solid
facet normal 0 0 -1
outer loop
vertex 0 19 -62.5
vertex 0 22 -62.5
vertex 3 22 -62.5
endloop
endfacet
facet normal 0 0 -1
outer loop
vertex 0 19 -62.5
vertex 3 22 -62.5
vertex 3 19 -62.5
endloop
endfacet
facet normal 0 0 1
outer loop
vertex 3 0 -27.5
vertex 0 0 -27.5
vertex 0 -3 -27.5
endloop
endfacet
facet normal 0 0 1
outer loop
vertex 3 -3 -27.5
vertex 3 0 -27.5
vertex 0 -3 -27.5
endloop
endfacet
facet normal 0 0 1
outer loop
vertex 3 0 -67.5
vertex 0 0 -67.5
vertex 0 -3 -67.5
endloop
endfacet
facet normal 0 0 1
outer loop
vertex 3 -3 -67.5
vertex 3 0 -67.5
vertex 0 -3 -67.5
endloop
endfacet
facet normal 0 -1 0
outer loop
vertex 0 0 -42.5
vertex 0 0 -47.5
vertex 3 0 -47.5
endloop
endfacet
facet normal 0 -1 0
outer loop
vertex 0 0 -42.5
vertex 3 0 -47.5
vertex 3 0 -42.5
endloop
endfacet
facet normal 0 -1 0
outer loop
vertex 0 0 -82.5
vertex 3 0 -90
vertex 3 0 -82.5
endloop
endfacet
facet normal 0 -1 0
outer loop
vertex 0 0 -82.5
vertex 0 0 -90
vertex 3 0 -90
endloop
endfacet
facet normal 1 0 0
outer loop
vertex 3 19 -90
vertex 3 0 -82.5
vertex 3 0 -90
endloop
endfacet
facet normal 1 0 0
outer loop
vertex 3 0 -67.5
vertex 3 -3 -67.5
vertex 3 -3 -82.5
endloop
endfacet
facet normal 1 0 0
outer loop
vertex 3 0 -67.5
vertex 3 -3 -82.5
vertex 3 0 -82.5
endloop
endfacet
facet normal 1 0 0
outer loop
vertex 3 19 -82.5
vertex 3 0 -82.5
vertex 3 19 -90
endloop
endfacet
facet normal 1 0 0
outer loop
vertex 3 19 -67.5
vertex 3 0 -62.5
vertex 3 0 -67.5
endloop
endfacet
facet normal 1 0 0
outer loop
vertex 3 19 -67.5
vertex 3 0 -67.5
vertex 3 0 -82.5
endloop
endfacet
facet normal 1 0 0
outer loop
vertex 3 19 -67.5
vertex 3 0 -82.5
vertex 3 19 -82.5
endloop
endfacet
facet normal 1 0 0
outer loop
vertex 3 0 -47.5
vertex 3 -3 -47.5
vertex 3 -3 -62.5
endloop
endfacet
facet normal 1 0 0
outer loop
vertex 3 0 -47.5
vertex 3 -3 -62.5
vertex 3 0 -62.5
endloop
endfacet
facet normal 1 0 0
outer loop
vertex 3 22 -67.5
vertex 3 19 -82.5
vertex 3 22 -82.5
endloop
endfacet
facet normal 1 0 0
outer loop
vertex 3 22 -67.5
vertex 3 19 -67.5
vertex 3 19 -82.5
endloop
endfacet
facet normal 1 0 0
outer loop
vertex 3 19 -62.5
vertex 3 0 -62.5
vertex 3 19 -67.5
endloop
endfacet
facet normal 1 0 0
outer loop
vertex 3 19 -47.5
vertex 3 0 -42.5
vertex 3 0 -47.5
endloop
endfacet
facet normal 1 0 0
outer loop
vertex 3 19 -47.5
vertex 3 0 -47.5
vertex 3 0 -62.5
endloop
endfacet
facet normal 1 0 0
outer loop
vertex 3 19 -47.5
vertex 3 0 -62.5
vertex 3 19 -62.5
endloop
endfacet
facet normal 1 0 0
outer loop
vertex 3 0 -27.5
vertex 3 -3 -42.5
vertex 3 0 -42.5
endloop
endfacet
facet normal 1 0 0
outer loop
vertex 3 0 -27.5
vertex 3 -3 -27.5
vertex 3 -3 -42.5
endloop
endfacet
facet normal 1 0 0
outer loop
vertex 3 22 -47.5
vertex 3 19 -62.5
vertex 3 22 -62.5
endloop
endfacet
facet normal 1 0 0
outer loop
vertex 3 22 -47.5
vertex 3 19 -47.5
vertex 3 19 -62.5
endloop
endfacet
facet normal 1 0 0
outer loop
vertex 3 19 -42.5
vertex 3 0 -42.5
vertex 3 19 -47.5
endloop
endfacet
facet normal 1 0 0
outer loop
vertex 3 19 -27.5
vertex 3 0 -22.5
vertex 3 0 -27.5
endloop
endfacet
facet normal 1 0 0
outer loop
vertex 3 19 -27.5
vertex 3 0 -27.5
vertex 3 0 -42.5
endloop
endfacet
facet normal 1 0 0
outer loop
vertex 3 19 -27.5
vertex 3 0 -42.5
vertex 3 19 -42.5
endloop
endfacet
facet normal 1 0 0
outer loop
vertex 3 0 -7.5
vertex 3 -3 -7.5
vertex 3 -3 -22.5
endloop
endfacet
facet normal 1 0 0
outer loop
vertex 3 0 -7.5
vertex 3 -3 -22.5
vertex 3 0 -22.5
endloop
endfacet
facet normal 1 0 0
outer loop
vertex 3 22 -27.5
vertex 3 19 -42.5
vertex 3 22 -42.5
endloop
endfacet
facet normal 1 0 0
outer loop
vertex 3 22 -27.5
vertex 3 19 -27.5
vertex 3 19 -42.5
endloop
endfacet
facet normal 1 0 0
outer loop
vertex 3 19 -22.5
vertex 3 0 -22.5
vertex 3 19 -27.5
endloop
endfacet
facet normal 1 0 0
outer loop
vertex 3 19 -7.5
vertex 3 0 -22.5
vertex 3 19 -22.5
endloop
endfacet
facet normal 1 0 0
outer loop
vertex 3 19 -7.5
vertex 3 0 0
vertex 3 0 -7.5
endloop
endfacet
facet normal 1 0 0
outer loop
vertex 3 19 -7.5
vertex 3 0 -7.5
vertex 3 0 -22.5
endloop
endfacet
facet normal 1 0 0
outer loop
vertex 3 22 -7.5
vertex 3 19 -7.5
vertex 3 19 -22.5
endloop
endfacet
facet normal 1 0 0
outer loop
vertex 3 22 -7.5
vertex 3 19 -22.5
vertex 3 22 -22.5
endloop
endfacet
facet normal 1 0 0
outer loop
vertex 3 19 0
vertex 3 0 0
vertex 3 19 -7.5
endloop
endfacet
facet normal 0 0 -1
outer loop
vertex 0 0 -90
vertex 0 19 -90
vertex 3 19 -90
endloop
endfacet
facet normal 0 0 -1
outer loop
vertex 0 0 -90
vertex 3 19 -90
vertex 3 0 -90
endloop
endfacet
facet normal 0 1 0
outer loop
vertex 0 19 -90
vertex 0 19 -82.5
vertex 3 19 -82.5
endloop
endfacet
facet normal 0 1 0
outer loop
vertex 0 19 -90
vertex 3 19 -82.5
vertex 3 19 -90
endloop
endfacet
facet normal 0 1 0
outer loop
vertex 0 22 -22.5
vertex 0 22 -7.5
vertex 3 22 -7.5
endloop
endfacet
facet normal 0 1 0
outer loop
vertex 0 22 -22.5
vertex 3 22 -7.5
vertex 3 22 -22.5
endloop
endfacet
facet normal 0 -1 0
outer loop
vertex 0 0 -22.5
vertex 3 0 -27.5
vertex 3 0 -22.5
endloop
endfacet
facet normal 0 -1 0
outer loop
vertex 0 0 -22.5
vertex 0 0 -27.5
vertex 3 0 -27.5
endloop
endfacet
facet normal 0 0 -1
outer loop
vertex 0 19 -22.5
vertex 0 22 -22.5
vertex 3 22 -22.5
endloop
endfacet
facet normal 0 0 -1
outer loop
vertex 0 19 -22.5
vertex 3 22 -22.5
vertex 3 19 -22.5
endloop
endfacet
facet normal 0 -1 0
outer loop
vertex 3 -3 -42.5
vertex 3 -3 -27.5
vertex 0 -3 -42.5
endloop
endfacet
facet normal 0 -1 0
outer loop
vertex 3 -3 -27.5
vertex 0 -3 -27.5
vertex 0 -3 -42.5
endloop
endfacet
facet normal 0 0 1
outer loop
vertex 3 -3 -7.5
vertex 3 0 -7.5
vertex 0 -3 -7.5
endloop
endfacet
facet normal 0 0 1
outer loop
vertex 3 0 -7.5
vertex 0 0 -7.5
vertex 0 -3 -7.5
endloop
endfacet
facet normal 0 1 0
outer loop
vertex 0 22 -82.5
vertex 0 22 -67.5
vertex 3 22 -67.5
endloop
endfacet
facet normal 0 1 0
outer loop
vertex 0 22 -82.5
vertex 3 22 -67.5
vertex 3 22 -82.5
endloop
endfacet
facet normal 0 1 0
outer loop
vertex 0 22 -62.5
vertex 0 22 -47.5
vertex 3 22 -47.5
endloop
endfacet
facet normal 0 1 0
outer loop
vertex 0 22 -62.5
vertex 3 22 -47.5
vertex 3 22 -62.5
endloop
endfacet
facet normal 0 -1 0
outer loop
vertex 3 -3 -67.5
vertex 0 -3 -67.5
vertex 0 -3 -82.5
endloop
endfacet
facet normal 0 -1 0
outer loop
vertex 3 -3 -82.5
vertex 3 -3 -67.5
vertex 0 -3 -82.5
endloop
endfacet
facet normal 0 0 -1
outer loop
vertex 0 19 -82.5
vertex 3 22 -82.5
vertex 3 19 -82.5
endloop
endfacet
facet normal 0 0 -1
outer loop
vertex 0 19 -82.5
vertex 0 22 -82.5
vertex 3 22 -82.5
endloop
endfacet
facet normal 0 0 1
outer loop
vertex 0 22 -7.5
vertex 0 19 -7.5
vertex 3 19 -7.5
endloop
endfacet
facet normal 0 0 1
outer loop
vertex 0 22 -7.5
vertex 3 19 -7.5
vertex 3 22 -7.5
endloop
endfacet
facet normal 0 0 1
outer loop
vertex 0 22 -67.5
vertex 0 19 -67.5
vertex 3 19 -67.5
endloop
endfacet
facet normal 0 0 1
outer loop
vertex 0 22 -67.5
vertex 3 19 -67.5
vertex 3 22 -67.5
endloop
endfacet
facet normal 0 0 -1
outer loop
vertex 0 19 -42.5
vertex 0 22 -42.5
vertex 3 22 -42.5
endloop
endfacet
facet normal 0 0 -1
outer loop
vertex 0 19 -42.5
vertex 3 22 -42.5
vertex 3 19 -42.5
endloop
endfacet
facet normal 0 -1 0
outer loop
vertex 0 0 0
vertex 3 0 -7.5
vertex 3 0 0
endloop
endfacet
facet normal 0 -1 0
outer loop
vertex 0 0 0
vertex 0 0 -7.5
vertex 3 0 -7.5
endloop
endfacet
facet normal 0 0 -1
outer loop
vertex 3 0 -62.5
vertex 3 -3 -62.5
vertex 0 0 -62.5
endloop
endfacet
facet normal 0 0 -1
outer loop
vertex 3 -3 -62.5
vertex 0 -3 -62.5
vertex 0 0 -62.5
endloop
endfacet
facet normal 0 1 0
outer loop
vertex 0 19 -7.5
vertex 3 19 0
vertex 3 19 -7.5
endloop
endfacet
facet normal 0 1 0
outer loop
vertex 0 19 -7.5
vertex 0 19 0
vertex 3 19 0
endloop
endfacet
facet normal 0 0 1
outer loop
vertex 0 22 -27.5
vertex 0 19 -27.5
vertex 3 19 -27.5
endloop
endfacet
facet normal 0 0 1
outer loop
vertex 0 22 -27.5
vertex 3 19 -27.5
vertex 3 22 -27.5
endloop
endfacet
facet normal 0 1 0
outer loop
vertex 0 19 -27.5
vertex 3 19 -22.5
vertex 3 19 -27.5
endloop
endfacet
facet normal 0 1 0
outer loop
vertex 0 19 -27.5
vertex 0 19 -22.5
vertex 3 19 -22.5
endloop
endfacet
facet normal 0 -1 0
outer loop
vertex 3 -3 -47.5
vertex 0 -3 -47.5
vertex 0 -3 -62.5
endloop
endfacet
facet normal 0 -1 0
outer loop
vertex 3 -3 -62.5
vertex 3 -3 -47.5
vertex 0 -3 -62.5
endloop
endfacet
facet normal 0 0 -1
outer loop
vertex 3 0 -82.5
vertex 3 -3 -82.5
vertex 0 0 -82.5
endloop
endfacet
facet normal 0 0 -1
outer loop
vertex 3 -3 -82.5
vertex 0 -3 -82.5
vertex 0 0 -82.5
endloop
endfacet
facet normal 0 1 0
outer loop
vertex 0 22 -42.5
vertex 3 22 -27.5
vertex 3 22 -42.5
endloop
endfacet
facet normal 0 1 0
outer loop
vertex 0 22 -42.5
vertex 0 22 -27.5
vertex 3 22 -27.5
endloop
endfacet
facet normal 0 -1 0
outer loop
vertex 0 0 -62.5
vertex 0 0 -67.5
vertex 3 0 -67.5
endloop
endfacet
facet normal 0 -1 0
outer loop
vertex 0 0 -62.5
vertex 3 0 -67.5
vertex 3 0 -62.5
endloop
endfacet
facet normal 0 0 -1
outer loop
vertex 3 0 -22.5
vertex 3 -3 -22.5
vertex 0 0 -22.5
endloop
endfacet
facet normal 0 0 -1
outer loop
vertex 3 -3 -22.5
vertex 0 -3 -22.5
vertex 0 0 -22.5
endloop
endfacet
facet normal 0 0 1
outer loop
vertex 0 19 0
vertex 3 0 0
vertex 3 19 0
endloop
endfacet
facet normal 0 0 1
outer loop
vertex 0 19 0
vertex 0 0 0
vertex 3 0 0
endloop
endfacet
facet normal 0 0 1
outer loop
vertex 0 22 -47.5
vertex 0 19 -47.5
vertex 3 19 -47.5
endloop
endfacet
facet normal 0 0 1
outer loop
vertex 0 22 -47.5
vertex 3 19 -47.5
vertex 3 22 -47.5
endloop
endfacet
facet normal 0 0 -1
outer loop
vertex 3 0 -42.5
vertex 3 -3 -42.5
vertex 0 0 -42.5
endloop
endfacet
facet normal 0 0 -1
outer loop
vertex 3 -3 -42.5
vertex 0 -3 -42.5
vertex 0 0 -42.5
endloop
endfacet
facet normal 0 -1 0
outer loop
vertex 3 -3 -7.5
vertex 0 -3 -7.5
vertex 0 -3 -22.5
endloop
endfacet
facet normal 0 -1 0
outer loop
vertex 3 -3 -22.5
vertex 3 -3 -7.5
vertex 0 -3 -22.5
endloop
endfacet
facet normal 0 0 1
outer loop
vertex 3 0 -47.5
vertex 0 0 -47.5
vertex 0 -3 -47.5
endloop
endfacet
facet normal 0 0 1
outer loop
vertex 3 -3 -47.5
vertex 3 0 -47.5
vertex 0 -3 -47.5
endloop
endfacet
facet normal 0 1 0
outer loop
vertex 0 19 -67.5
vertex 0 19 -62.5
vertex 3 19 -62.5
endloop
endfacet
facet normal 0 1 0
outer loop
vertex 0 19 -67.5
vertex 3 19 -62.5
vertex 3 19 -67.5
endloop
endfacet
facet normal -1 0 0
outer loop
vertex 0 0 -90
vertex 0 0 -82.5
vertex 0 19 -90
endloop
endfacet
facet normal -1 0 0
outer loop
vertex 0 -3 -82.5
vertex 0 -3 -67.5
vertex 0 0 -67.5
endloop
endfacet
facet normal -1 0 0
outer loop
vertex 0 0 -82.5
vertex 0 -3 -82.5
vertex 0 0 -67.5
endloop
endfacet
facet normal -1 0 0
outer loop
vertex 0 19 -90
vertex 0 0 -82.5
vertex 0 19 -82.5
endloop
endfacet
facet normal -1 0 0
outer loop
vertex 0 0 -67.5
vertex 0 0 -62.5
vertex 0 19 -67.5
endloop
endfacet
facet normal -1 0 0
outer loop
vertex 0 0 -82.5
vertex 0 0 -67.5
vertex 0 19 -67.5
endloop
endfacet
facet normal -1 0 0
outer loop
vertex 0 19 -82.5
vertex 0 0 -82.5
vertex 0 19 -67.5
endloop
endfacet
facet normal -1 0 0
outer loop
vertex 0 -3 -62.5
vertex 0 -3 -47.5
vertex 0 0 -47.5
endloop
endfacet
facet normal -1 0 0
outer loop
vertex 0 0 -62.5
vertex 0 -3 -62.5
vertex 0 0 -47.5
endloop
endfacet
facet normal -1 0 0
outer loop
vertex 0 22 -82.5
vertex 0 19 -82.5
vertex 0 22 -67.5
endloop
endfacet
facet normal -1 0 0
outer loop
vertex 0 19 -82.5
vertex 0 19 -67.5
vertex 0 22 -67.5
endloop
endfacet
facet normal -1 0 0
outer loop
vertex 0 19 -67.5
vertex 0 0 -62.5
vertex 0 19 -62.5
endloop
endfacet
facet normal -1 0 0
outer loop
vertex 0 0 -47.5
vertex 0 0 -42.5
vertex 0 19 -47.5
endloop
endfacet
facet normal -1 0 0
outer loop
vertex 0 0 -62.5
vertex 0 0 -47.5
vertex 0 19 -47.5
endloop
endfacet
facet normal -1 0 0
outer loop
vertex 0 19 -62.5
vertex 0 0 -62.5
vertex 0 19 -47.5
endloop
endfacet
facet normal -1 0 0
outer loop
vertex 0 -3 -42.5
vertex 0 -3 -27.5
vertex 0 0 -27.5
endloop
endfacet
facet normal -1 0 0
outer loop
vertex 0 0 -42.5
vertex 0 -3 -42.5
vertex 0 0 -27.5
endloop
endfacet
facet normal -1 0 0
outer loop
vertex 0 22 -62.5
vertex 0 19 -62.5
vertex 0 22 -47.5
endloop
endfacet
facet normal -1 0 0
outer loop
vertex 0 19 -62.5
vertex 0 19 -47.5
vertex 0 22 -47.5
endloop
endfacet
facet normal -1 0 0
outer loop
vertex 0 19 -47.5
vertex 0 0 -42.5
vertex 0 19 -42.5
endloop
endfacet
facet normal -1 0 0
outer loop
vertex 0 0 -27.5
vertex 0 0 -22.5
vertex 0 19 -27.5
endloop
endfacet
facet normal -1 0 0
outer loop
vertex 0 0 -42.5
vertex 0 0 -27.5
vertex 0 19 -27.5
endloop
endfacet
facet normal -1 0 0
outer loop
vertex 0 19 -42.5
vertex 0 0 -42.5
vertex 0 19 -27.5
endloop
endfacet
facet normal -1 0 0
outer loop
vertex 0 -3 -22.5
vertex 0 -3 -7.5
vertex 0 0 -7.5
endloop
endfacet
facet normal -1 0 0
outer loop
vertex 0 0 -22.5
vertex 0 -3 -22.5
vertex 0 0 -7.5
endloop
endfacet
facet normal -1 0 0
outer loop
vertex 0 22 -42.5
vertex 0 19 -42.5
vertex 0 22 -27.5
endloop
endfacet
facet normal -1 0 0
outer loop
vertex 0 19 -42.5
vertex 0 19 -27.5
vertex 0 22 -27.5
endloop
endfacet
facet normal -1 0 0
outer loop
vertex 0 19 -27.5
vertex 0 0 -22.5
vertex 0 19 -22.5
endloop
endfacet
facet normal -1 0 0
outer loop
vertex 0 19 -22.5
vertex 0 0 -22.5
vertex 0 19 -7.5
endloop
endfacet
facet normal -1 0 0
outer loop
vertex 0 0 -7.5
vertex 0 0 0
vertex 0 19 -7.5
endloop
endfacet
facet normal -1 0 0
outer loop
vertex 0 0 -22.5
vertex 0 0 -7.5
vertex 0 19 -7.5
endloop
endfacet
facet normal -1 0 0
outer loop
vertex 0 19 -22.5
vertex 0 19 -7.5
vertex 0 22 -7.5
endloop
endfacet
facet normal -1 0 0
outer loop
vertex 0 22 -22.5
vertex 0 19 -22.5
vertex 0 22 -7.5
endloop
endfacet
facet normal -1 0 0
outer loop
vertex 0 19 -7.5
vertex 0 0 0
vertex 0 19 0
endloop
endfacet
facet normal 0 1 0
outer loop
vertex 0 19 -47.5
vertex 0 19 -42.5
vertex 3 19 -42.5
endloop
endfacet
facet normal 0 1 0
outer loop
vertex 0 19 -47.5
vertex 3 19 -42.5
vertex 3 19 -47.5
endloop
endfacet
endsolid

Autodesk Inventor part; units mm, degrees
ref_plane "YZ Plane" through (0, 0, 0) normal (1, 0, 0) x (0, 1, 0)
ref_plane "XZ Plane" through (0, 0, 0) normal (0, 1, 0) x (-1, 0, 0)
ref_plane "XY Plane" through (0, 0, 0) normal (0, 0, 1) x (1, 0, 0)
sketch "Boceto1" plane through (0, 0, 0) normal (1, 0, 0) x (0, 1, 0)
  line L0 (0, 0) -> (19, 0)
  line L1 (19, 0) -> (19, -90)
  line L2 (19, -90) -> (0, -90)
  line L3 (0, -90) -> (0, 0)
  line L4 (19, -7.5) -> (22, -7.5)
  line L5 (22, -7.5) -> (22, -22.5)
  line L6 (22, -22.5) -> (19, -22.5)
  line L7 (19, -22.5) -> (19, -7.5)
  line L8 (19, -27.5) -> (22, -27.5)
  line L9 (22, -27.5) -> (22, -42.5)
  line L10 (22, -42.5) -> (19, -42.5)
  line L11 (19, -42.5) -> (19, -27.5)
  line L12 (19, -47.5) -> (22, -47.5)
  line L13 (22, -47.5) -> (22, -62.5)
  line L14 (22, -62.5) -> (19, -62.5)
  line L15 (19, -62.5) -> (19, -47.5)
  line L16 (19, -67.5) -> (22, -67.5)
  line L17 (22, -67.5) -> (22, -82.5)
  line L18 (22, -82.5) -> (19, -82.5)
  line L19 (19, -82.5) -> (19, -67.5)
  line L20 (9.5, 0) -> (9.5, -90) construction
  line L21 (0, -7.5) -> (-3, -7.5)
  line L22 (-3, -7.5) -> (-3, -22.5)
  line L23 (-3, -22.5) -> (0, -22.5)
  line L24 (0, -22.5) -> (0, -7.5)
  line L25 (0, -27.5) -> (-3, -27.5)
  line L26 (-3, -27.5) -> (-3, -42.5)
  line L27 (-3, -42.5) -> (0, -42.5)
  line L28 (0, -42.5) -> (0, -27.5)
  line L29 (0, -47.5) -> (-3, -47.5)
  line L30 (-3, -47.5) -> (-3, -62.5)
  line L31 (-3, -62.5) -> (0, -62.5)
  line L32 (0, -62.5) -> (0, -47.5)
  line L33 (0, -67.5) -> (-3, -67.5)
  line L34 (-3, -67.5) -> (-3, -82.5)
  line L35 (-3, -82.5) -> (0, -82.5)
  line L36 (0, -82.5) -> (0, -67.5)
  point P0 (20.5, -7.5)
  point P1 (20.5, -27.5)
  point P2 (20.5, -47.5)
  point P3 (20.5, -67.5)
  point P4 (-1.5, -7.5)
  point P5 (-1.5, -27.5)
  point P6 (-1.5, -47.5)
  point P7 (-1.5, -67.5)
  point P8 (0, -22.5)
  point P9 (0, -27.5)
  point P10 (0, -42.5)
  point P11 (0, -47.5)
  point P12 (0, -62.5)
  point P13 (0, -67.5)
  point P14 (0, -82.5)
  point P15 (19, -82.5)
  point P16 (19, -67.5)
  point P17 (19, -62.5)
  point P18 (19, -47.5)
  point P19 (19, -42.5)
  point P20 (19, -27.5)
  point P21 (19, -22.5)
  point P22 (0, -7.5)
  dimension "d0" = 19
  dimension "d1" = 90
  dimension "d2" = 3
  dimension "d3" = 15
  dimension "d4" = 7.5
  dimension "d7" = 20
extrude "Extrusión1" add sketch "Boceto1" along normal blind 3
